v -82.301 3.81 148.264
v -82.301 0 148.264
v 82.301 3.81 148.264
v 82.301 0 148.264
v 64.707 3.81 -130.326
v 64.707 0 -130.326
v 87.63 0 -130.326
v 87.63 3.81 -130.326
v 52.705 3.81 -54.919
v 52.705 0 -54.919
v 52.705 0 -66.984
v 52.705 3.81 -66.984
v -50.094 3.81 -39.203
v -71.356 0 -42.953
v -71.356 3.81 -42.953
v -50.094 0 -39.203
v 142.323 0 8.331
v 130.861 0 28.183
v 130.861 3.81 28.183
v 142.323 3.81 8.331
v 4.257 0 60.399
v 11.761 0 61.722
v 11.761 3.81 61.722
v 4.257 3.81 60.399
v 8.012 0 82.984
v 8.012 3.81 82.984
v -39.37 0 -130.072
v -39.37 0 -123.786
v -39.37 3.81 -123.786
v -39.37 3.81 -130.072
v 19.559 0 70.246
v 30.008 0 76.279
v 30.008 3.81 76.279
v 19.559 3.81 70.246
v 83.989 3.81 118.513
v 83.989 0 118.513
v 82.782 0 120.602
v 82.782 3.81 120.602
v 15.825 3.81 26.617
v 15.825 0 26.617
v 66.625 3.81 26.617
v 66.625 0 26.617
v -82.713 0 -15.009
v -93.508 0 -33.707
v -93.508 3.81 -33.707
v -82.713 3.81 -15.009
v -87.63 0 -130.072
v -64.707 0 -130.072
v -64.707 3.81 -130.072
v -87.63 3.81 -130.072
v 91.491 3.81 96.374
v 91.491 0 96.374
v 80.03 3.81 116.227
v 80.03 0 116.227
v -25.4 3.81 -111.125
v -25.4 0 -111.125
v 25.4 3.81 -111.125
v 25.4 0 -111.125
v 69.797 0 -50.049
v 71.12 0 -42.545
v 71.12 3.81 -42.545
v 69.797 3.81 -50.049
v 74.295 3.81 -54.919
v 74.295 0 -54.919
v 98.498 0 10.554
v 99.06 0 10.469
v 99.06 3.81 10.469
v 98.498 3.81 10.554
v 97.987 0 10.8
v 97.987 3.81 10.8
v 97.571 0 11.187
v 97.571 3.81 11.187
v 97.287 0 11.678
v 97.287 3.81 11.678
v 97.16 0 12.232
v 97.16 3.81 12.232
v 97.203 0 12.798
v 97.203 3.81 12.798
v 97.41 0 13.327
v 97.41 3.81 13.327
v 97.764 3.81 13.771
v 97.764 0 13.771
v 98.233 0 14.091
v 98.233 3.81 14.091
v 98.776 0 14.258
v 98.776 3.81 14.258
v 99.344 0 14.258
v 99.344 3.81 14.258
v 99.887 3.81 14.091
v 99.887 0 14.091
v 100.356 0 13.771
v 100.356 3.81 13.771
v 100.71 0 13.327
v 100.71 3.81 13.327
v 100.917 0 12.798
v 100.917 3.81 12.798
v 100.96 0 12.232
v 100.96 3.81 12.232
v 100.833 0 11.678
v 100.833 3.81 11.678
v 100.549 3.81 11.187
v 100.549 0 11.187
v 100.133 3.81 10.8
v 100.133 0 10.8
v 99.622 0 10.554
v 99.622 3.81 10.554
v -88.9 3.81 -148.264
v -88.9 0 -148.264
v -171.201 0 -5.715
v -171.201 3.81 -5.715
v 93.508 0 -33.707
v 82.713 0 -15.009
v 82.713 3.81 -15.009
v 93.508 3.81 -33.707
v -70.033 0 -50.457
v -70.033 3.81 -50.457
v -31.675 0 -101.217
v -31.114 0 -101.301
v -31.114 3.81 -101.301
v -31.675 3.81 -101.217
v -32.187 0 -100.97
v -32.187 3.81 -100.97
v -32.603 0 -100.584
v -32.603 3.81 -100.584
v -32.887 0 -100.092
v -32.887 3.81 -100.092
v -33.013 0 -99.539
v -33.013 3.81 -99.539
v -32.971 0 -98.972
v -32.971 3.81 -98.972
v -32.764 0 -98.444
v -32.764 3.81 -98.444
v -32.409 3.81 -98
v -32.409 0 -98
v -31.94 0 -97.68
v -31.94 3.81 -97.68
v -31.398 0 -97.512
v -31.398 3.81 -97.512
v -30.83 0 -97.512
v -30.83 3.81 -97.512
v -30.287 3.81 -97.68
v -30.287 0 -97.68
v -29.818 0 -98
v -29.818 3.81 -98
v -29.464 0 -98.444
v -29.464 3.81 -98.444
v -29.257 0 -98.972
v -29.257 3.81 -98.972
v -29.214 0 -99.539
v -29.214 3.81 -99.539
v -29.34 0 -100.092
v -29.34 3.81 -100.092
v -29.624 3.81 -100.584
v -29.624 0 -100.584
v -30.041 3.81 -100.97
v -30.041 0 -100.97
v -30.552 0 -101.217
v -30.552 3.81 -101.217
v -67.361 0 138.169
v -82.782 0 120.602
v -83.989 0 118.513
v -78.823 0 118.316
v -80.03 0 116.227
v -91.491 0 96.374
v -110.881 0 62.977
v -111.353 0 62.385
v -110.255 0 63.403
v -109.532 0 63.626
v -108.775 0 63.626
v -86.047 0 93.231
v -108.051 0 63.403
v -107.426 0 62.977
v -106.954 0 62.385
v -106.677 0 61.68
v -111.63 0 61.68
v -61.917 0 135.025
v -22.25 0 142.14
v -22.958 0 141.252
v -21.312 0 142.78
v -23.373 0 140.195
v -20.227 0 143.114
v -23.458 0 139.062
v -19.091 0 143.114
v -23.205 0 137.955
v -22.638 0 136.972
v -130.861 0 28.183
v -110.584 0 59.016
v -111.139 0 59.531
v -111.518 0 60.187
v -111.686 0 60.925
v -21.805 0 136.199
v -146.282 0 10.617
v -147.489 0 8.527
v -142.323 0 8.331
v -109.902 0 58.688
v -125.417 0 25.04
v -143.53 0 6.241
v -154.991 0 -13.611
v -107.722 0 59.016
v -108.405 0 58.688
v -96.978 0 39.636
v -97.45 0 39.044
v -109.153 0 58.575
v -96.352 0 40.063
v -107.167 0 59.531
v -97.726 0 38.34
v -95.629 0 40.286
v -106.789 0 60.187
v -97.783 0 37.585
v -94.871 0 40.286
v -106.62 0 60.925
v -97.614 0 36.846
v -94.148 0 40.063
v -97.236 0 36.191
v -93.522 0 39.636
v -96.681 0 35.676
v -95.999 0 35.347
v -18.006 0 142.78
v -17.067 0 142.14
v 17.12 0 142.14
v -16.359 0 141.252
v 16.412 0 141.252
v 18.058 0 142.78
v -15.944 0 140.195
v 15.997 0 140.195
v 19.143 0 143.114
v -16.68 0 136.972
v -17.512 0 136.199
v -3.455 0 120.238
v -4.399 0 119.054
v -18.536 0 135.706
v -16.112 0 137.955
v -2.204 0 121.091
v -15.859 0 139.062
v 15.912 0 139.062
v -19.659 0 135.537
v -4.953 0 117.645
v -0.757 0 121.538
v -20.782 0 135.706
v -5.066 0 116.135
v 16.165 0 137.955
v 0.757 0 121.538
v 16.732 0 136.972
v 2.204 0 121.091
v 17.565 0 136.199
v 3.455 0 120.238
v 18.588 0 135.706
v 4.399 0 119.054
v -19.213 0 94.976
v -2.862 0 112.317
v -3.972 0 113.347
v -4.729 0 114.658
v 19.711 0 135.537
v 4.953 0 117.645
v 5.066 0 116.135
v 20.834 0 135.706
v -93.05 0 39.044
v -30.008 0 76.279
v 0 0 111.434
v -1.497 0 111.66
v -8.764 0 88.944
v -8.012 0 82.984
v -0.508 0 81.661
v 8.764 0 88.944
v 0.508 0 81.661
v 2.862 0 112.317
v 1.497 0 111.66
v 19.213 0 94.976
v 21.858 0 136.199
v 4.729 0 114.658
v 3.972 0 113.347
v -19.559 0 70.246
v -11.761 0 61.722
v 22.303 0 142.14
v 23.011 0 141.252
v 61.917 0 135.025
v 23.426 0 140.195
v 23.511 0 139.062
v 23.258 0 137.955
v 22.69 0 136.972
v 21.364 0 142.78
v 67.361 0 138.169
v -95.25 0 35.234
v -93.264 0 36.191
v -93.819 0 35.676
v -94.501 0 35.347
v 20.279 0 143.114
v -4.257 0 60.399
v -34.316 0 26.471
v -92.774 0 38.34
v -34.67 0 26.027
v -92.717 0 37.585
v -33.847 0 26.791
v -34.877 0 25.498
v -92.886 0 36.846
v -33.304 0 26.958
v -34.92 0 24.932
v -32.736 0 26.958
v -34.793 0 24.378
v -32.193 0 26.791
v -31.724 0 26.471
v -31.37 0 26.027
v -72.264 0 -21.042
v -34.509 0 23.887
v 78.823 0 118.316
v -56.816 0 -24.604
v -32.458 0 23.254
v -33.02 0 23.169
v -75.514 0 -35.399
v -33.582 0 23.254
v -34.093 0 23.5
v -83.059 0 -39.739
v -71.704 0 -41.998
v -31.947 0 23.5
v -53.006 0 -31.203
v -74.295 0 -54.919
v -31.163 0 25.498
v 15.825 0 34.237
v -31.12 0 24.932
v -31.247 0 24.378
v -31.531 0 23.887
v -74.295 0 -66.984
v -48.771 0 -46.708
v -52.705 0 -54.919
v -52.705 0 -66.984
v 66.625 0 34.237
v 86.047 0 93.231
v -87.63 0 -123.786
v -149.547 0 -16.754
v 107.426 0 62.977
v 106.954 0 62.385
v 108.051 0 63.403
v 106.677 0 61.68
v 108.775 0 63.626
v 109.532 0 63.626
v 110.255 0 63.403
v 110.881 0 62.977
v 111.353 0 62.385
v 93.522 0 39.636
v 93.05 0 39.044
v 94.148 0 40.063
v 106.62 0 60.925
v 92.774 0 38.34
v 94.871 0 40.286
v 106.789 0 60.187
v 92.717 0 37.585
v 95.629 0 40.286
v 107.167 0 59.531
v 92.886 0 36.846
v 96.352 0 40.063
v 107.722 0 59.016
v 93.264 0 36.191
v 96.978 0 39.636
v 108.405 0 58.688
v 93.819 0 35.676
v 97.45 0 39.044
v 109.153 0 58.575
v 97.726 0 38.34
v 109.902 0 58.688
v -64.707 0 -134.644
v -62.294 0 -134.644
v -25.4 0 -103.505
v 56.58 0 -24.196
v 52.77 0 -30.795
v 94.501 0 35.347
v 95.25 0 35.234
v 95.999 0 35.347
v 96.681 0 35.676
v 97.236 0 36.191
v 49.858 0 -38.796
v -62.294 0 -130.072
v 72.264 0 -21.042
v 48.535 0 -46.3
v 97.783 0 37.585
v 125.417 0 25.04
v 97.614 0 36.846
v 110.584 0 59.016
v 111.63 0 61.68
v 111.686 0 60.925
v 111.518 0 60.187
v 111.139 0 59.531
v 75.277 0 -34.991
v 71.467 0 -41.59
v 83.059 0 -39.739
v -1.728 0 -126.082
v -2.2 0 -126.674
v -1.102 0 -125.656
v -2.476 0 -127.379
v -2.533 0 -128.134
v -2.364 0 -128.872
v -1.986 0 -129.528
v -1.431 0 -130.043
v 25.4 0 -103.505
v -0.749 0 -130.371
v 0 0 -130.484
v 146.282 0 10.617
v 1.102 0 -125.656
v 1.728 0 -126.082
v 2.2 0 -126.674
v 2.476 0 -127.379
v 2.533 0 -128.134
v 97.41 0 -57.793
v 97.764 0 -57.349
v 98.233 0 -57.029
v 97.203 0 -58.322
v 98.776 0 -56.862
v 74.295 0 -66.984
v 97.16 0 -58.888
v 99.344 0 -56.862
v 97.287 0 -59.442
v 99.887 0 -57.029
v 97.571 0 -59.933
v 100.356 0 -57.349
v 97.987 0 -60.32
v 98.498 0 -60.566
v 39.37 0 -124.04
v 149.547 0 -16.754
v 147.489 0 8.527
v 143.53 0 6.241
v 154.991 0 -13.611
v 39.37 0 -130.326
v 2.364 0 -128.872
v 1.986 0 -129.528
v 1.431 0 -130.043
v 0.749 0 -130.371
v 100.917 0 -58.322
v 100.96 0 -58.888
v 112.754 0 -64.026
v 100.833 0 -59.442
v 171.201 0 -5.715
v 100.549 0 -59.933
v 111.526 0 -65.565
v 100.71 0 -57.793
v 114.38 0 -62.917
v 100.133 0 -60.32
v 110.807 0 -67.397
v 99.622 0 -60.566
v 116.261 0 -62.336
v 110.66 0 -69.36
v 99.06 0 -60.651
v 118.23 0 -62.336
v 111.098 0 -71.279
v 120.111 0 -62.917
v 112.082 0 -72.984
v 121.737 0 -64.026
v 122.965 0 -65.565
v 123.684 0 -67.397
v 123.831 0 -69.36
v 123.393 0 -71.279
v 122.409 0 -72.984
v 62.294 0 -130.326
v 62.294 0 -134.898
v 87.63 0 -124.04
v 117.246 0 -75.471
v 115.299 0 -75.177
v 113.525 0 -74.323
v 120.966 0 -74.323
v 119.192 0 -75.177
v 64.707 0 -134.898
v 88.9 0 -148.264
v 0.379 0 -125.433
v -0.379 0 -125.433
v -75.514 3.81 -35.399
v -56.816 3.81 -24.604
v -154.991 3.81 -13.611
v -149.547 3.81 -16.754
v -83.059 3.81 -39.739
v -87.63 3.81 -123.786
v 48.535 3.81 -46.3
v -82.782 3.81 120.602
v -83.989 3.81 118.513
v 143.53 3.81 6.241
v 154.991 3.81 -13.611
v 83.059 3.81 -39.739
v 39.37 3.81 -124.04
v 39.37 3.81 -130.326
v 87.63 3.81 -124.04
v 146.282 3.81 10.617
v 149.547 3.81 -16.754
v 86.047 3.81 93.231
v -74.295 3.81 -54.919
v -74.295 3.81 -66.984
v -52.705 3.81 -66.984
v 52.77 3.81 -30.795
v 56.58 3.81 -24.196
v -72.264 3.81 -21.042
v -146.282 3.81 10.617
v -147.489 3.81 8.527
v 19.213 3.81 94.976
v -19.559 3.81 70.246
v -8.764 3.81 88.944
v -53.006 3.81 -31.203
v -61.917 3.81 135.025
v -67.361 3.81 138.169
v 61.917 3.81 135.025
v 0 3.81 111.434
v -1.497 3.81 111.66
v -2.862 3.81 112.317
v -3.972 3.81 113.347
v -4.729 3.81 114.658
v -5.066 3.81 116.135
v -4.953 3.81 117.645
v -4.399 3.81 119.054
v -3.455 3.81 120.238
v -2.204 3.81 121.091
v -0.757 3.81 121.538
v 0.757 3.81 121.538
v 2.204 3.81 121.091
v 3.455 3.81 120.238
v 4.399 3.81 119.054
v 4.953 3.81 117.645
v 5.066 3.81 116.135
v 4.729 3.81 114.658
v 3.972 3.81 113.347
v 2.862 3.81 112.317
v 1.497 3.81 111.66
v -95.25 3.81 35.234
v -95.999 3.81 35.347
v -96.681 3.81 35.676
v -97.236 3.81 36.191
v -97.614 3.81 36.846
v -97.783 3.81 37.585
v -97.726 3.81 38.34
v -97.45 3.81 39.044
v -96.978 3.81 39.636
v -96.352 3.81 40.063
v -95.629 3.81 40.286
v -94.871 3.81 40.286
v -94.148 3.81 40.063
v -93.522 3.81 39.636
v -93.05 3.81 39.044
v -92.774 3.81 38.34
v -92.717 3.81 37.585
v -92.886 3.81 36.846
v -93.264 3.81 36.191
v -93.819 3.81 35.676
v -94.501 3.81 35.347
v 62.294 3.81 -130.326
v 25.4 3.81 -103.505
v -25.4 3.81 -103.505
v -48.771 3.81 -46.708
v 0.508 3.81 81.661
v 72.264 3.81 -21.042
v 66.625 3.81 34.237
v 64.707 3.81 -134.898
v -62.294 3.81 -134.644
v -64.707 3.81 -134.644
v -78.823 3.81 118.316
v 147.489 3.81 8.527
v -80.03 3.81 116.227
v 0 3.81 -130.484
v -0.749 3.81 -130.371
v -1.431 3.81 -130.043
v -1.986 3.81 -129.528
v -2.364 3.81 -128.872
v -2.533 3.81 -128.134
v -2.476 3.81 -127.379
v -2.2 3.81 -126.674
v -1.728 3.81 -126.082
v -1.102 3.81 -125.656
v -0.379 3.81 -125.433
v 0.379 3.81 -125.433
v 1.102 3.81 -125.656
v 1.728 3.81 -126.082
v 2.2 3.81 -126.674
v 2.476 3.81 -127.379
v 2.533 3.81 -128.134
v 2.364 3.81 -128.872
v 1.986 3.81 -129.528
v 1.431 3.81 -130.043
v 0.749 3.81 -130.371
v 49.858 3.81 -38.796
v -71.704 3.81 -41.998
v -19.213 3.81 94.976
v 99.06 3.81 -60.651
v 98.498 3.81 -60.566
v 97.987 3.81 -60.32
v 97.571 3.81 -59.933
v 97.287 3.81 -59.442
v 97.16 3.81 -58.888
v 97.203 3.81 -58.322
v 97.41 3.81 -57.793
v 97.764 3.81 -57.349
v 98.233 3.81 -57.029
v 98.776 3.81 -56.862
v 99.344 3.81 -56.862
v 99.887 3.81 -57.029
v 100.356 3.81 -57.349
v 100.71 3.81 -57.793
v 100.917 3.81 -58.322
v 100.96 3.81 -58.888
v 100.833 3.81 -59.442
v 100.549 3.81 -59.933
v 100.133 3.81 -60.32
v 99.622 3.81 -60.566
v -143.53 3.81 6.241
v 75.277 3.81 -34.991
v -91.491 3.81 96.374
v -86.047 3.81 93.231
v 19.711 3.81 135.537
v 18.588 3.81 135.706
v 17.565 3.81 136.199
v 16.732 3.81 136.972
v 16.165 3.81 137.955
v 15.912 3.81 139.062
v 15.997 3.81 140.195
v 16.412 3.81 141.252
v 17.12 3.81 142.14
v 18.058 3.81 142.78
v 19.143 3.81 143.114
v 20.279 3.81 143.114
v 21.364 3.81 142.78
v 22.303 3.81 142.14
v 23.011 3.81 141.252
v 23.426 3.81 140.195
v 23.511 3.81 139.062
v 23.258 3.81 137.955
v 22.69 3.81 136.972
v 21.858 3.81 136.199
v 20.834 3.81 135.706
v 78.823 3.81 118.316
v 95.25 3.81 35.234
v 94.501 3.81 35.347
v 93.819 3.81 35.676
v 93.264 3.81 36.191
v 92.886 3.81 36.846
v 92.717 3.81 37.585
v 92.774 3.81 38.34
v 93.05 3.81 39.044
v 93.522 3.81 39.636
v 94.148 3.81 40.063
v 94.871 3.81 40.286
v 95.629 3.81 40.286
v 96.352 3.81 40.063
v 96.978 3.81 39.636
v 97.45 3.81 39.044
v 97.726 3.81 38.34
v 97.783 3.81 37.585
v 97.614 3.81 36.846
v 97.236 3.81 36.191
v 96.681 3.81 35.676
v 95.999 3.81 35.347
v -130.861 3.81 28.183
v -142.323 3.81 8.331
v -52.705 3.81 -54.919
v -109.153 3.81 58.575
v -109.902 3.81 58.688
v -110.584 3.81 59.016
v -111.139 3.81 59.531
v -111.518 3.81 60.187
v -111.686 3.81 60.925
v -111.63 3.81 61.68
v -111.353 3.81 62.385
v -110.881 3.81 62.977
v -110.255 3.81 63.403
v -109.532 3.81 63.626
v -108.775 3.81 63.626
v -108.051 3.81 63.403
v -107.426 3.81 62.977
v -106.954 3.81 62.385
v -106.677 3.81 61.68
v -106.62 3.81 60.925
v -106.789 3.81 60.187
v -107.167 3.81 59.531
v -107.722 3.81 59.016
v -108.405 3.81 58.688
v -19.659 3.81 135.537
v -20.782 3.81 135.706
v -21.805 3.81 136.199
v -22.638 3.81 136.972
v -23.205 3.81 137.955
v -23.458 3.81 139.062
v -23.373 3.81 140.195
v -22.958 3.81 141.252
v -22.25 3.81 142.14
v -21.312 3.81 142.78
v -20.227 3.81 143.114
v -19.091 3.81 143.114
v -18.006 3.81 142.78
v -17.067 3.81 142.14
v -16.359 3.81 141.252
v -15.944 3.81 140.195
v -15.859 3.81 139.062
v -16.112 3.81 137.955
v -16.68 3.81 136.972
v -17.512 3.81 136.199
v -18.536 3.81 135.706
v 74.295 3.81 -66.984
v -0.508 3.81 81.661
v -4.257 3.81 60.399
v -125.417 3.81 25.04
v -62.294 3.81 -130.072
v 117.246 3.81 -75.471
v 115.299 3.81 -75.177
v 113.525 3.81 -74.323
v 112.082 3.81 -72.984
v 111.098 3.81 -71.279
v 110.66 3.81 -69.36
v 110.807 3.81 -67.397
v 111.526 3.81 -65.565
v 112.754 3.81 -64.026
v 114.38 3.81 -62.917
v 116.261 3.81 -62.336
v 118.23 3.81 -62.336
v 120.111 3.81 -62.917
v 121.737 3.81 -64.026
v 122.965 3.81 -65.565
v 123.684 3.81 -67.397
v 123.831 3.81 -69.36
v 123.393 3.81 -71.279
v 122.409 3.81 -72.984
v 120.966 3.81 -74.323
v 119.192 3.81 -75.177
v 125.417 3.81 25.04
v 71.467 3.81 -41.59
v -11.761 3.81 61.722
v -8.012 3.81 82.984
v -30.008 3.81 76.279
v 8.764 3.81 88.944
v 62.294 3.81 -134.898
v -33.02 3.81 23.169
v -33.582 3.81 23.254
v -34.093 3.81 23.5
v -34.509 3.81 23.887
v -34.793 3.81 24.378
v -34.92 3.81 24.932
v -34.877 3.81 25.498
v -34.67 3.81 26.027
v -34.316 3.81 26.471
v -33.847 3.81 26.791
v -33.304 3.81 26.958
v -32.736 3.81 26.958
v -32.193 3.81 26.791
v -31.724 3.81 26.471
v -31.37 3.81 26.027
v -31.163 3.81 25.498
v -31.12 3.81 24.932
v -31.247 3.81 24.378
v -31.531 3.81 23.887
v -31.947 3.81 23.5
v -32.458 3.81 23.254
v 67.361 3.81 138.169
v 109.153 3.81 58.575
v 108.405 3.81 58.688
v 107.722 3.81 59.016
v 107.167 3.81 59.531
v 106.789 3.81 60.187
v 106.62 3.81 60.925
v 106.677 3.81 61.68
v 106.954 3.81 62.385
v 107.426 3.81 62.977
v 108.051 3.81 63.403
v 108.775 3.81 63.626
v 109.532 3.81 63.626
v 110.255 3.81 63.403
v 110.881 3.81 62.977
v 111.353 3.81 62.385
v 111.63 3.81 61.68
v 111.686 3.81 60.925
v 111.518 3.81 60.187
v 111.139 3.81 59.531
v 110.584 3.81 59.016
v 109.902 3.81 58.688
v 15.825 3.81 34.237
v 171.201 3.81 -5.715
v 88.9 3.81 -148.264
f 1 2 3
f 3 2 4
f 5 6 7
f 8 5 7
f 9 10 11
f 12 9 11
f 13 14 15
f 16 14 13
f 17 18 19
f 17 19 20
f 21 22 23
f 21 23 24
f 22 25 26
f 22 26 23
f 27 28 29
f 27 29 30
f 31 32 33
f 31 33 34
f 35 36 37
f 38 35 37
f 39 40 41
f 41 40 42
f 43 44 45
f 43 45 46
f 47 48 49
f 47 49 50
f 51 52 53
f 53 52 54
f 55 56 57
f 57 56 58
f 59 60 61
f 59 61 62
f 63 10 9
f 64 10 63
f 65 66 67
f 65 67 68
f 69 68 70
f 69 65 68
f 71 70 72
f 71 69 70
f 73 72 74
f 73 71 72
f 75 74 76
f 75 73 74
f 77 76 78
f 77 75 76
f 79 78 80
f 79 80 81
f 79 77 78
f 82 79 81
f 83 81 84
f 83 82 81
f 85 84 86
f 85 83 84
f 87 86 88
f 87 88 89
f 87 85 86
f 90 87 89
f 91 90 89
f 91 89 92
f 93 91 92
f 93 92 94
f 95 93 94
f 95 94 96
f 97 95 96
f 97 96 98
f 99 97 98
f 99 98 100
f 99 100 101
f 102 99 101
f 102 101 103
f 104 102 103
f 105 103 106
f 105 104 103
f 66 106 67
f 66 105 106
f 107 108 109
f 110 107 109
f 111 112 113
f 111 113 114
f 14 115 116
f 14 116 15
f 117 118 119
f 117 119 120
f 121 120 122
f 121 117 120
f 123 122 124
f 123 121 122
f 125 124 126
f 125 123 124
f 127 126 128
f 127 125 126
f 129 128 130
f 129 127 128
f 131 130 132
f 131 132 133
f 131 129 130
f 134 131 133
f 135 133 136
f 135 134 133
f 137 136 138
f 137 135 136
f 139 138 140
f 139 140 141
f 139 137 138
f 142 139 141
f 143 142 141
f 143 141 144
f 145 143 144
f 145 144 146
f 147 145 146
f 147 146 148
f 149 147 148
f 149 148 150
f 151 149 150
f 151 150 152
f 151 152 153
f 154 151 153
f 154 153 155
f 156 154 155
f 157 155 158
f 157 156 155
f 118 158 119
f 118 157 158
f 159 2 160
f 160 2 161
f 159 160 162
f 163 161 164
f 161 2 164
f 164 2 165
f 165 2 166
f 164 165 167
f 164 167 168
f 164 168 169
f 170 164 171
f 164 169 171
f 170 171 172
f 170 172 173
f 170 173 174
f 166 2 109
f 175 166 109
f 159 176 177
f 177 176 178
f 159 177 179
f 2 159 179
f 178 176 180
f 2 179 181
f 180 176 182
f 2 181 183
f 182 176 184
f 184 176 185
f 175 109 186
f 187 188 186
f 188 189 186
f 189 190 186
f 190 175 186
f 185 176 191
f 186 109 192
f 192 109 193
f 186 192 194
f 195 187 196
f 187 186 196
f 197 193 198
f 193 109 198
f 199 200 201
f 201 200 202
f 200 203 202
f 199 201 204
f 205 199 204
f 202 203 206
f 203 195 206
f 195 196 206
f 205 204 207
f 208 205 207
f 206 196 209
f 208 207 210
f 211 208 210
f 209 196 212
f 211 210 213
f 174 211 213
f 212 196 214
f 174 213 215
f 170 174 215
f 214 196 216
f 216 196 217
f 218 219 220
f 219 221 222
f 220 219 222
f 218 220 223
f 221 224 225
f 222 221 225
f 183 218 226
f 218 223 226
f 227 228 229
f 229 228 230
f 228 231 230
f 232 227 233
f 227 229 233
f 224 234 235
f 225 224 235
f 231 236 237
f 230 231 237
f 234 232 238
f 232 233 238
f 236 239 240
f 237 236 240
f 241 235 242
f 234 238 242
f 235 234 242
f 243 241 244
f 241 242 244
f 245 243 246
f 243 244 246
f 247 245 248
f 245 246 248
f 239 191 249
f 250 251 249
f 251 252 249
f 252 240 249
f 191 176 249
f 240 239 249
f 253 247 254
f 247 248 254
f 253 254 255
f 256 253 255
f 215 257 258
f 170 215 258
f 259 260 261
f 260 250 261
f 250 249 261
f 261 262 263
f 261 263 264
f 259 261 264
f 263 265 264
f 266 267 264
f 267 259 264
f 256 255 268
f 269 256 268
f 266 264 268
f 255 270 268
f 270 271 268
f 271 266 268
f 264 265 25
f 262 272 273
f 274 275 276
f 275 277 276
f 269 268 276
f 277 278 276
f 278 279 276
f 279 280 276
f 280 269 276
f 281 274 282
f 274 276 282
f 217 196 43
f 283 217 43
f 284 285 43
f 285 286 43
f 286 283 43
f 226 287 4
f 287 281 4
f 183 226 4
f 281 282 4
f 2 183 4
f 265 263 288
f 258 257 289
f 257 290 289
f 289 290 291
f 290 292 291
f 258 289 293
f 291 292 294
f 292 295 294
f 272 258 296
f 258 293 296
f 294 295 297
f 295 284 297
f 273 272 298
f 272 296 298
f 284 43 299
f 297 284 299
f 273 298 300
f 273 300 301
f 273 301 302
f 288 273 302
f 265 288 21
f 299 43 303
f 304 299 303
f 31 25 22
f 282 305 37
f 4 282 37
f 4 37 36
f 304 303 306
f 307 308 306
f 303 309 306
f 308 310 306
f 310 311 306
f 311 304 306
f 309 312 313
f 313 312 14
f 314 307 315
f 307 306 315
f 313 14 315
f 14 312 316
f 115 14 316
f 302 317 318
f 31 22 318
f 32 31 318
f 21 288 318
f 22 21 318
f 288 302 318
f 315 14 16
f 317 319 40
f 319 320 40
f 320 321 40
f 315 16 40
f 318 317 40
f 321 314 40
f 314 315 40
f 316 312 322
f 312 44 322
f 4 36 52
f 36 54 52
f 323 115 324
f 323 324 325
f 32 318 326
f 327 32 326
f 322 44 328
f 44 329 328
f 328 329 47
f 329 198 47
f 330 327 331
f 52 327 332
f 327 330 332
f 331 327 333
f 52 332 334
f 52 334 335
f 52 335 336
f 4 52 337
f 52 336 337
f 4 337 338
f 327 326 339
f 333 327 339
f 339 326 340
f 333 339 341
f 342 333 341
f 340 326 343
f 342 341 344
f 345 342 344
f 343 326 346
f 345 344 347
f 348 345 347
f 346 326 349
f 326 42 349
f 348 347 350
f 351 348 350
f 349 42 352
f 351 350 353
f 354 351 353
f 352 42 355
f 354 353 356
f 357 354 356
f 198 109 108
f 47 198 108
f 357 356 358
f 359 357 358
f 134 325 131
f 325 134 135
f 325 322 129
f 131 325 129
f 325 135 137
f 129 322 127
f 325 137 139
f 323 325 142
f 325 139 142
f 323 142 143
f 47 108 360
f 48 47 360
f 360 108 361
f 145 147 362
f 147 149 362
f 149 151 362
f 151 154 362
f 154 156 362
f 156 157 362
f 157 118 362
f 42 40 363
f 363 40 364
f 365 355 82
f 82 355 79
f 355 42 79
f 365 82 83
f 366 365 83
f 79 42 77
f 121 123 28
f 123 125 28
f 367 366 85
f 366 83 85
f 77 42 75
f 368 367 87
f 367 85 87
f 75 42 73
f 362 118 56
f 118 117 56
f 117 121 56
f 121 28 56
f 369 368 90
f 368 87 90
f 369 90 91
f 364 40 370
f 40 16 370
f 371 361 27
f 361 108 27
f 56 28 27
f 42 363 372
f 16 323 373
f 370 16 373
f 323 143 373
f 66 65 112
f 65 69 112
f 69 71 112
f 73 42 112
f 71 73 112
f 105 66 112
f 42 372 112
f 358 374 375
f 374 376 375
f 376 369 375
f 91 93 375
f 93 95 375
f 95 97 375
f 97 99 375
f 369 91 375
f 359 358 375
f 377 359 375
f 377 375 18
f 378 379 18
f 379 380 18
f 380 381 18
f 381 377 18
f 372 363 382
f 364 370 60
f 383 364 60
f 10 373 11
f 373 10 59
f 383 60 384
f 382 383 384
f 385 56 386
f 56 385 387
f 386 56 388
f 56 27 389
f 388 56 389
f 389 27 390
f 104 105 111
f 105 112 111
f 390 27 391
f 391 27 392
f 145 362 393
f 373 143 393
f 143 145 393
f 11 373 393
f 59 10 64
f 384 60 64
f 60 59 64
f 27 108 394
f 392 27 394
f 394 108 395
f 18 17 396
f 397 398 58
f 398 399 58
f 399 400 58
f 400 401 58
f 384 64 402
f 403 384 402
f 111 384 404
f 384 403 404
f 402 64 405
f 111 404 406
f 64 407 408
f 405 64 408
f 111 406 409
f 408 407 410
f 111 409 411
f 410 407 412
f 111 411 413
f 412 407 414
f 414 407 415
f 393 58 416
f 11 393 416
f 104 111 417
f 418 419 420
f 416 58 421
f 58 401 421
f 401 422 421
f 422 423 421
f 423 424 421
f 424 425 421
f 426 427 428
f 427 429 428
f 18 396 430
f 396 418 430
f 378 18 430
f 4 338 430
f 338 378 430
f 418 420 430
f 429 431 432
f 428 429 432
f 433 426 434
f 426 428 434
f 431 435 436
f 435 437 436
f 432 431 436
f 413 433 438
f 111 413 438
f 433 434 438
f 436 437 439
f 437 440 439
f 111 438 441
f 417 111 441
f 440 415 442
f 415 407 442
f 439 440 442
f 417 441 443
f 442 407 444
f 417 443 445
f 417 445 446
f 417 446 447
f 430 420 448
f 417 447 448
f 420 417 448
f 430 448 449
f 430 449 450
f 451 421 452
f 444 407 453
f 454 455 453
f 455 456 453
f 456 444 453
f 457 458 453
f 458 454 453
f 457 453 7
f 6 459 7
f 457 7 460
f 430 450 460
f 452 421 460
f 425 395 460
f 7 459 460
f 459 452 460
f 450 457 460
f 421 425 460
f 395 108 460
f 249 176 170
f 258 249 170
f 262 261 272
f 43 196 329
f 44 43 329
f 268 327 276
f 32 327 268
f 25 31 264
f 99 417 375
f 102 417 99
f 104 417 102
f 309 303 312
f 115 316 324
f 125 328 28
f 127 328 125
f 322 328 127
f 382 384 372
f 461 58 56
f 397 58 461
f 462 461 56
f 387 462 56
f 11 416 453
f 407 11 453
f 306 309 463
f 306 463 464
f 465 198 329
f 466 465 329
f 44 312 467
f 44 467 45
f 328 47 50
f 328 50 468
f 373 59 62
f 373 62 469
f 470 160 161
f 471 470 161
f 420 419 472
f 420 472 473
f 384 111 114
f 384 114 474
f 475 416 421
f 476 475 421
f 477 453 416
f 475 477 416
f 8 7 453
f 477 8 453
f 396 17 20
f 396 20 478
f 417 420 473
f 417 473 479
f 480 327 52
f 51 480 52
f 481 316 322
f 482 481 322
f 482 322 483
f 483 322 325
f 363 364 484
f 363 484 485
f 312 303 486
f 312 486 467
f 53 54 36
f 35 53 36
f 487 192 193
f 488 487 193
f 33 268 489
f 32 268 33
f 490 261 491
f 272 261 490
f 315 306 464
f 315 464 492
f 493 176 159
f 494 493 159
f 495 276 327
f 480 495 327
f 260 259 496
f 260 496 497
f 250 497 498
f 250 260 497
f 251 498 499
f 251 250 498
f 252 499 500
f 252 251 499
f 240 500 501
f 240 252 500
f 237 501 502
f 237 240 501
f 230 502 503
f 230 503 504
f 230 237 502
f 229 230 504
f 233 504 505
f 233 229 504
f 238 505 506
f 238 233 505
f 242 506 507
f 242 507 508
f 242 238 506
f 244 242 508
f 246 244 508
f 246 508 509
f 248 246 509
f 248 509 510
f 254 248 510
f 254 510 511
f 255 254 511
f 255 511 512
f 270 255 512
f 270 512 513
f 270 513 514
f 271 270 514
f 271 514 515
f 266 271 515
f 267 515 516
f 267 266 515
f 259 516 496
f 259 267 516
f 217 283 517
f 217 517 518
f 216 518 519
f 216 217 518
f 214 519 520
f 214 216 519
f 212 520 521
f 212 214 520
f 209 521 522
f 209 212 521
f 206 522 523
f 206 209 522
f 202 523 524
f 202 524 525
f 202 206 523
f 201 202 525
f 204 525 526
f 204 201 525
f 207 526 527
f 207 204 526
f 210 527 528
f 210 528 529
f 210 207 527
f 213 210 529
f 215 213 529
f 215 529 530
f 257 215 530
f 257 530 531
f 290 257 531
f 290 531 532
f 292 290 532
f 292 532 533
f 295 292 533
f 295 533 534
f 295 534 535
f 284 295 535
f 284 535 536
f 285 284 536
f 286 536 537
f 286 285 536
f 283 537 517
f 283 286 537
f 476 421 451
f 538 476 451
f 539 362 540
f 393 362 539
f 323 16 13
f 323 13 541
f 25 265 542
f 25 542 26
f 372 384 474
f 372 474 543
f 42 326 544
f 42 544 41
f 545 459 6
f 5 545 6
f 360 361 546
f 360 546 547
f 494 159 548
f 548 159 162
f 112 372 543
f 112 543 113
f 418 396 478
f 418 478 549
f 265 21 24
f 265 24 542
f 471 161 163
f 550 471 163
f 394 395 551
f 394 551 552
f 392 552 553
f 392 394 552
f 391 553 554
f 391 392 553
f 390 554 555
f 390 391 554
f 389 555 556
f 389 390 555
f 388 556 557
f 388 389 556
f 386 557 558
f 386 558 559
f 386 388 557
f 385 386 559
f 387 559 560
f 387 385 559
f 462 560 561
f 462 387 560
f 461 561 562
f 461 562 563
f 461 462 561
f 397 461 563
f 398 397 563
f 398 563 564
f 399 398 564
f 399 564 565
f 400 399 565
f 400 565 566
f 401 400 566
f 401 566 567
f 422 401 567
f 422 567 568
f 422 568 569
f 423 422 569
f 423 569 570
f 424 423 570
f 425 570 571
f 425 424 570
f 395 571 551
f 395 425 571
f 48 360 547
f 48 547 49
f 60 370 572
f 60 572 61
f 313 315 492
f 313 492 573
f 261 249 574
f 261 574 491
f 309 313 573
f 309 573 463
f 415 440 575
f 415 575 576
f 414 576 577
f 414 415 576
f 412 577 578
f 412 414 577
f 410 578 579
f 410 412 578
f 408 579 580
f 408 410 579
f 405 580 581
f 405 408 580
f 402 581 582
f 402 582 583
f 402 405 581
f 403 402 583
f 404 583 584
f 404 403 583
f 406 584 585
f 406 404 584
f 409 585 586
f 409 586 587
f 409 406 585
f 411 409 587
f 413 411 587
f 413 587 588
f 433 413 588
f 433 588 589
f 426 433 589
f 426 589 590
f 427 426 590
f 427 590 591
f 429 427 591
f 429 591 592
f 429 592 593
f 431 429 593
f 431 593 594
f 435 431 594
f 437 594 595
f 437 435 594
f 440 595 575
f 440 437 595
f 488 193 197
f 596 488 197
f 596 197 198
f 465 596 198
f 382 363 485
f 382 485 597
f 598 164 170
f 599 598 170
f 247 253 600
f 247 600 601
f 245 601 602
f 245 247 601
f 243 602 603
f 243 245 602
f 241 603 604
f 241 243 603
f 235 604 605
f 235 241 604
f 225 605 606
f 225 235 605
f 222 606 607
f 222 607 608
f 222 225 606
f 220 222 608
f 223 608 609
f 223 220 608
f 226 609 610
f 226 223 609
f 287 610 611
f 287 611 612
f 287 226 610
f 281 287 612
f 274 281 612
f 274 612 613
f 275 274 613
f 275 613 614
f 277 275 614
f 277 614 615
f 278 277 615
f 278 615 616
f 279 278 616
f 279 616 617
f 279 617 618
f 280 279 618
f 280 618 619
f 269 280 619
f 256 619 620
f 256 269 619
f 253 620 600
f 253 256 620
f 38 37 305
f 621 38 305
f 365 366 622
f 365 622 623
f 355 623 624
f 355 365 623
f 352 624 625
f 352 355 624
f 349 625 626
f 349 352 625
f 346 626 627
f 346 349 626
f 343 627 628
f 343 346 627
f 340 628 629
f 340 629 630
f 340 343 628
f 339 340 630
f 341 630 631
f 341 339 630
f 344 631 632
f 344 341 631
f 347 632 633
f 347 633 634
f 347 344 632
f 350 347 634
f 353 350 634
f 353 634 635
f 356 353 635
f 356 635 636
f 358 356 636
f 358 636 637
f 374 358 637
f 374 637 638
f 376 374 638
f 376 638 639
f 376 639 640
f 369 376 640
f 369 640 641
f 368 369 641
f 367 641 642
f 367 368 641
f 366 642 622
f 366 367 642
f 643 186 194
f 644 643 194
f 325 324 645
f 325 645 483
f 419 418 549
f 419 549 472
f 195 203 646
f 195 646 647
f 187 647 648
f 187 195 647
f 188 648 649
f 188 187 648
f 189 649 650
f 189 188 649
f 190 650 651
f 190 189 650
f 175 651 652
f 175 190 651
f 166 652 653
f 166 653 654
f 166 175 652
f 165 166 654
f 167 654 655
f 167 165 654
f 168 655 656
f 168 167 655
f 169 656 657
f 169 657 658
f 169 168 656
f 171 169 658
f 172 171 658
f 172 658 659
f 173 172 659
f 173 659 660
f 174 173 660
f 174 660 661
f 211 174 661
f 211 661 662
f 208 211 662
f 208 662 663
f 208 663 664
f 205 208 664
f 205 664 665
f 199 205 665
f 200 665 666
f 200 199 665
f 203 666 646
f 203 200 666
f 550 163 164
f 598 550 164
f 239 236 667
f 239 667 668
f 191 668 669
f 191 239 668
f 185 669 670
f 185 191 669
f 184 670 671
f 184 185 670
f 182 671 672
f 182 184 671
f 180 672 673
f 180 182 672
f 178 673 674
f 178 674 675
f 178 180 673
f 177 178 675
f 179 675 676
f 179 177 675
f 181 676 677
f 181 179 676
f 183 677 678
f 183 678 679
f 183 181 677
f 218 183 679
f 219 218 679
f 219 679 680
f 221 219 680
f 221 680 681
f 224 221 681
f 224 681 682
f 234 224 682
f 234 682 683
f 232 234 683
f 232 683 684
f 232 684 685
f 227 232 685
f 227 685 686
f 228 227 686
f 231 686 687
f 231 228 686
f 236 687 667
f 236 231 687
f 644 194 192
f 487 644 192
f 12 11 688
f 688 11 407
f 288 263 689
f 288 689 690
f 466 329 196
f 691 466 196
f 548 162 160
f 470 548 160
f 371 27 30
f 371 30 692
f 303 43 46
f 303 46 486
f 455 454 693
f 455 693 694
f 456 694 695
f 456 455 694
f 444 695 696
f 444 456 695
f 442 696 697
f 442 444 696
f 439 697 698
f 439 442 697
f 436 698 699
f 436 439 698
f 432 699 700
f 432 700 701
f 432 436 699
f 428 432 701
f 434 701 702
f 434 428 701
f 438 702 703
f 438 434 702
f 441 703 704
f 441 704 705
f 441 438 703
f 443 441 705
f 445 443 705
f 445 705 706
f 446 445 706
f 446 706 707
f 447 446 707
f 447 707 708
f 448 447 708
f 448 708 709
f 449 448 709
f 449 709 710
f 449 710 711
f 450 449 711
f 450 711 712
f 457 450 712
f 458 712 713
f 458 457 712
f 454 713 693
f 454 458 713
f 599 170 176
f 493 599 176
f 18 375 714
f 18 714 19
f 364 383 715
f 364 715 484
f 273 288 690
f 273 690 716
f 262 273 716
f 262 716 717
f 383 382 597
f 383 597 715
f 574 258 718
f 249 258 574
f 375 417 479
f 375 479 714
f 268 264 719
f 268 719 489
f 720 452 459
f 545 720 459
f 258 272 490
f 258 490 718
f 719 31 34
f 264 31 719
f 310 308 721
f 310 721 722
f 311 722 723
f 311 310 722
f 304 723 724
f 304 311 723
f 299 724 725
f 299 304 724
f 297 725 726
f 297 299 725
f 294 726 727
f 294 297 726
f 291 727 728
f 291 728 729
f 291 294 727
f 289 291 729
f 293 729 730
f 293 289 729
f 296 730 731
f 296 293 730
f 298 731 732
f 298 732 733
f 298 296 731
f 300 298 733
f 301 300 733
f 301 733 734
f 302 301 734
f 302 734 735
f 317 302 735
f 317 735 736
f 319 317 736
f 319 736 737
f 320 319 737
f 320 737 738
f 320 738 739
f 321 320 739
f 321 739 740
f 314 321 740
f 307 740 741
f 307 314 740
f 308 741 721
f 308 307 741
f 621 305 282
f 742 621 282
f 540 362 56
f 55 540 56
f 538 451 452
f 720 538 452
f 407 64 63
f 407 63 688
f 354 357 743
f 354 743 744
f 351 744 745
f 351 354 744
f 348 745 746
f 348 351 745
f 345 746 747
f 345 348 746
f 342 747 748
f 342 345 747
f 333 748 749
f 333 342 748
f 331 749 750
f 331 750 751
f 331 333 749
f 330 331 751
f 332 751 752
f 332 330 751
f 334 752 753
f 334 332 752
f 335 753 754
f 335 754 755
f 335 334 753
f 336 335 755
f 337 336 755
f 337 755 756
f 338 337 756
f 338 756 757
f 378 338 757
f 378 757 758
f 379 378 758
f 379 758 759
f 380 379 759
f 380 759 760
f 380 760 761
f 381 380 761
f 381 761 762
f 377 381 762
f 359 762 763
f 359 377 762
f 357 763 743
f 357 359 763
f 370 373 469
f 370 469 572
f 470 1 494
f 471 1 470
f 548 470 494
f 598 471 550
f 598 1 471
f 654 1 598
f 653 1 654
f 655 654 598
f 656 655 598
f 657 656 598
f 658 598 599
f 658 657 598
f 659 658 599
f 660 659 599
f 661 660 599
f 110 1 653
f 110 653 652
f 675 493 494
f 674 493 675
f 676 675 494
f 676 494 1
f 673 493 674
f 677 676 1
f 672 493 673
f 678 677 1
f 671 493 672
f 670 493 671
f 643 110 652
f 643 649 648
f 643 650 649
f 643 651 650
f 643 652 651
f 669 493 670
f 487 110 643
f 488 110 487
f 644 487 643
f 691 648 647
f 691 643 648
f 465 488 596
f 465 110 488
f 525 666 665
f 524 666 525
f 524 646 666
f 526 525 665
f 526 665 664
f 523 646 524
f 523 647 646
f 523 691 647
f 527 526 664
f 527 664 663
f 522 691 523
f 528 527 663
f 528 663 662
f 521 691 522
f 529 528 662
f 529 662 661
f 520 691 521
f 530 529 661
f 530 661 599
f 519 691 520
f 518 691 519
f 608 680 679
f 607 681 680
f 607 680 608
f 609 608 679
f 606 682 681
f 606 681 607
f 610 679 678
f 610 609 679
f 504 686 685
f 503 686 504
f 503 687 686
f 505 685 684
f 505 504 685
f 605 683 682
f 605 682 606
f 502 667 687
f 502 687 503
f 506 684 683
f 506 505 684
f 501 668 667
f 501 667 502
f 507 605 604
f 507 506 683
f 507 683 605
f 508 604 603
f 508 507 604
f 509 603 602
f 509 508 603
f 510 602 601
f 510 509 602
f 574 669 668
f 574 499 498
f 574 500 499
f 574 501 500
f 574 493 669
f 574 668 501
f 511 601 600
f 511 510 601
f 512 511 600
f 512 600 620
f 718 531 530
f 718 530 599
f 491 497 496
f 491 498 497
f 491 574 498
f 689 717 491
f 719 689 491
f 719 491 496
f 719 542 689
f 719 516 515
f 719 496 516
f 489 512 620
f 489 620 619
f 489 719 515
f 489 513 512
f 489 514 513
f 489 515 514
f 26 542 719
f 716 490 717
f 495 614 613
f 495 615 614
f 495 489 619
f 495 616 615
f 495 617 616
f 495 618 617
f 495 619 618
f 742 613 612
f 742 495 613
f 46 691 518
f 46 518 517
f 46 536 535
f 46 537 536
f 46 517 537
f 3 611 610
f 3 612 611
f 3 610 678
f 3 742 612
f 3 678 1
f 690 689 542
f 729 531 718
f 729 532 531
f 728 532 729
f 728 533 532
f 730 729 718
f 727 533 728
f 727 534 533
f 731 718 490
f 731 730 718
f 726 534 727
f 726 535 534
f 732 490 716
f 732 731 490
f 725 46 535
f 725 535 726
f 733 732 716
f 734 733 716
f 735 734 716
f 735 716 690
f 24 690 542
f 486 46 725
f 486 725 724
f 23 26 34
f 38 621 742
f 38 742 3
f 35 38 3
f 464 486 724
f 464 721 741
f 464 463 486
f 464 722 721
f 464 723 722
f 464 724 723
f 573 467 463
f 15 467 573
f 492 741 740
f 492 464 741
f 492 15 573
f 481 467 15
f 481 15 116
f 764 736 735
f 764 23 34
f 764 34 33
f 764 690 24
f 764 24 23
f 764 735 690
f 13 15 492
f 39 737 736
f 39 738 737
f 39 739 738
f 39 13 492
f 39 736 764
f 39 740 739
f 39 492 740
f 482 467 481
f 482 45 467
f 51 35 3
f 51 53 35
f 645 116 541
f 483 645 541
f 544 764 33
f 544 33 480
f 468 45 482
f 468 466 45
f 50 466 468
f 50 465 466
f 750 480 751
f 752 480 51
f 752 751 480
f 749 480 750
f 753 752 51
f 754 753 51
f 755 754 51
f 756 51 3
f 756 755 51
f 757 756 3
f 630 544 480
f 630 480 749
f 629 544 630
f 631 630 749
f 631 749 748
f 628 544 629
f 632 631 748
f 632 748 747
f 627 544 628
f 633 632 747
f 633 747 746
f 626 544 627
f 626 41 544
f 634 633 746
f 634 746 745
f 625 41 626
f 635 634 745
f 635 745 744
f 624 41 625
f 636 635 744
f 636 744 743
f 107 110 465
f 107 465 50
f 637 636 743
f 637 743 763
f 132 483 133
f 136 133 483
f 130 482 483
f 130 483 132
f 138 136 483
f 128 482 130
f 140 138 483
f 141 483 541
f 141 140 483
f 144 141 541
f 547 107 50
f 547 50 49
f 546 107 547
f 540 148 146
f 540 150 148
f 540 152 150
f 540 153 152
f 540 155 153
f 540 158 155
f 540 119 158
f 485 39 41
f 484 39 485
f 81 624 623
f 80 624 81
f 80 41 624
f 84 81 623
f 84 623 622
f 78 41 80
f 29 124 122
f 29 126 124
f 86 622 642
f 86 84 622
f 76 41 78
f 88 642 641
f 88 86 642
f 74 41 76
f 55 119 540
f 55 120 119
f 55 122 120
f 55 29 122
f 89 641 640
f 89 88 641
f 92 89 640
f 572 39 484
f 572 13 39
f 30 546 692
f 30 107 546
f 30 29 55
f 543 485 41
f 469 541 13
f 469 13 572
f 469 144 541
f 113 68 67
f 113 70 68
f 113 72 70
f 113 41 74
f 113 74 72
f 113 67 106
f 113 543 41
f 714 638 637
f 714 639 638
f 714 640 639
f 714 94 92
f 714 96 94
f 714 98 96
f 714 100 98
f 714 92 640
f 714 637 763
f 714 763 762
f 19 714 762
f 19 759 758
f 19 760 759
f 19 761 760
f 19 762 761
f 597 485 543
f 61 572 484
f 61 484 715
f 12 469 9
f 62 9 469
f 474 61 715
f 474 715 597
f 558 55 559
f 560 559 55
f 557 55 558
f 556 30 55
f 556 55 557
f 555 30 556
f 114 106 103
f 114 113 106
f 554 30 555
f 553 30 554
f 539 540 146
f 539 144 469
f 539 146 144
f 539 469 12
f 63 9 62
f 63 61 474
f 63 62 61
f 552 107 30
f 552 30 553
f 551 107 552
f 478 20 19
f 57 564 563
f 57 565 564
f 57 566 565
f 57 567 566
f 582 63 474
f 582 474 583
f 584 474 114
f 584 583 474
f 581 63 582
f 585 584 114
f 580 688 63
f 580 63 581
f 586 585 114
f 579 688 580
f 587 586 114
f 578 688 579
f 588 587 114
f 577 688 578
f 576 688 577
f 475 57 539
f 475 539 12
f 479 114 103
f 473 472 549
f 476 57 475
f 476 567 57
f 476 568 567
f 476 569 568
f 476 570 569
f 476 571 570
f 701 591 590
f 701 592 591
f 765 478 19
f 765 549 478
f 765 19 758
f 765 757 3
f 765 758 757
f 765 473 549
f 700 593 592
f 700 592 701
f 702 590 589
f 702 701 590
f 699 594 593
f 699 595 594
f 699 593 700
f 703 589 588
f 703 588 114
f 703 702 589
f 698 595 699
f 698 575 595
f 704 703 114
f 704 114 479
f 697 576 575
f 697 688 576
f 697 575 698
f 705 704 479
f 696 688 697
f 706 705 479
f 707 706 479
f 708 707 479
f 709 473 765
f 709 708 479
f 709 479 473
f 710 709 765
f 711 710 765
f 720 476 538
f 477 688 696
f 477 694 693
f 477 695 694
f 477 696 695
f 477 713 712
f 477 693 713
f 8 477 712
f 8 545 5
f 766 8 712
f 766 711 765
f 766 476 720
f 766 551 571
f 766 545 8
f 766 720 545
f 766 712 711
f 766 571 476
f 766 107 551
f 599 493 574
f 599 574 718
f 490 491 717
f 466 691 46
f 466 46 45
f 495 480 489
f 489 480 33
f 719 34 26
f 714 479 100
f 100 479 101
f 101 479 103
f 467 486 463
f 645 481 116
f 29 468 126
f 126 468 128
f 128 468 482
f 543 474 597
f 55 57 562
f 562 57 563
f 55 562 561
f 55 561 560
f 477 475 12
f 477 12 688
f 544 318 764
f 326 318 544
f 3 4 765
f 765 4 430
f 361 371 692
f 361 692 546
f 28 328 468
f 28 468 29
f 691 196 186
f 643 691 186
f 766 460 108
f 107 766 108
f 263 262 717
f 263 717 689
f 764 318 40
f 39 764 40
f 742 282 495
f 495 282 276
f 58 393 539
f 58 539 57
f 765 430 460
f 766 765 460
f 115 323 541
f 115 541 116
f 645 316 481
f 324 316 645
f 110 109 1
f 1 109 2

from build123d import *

# Parameters (mm, degrees)
SKETCH1_R           = 5.08
SKETCH1_R_2         = 3.81
SKETCH1_R_3         = 2.54
SKETCH1_R_4         = 1.905
SKETCH1_R_5         = 6.604
SKETCH1_W           = 21.59
SKETCH1_H           = 12.065
SKETCH1_W_2         = 50.8
SKETCH1_H_2         = 7.62
BOSS_EXTRUDE1_DEPTH = 3.81


with BuildPart() as part:
    # Sketch1 → Boss-Extrude1 (new body)
    with BuildSketch(Plane(origin=(0, 0, 0), x_dir=(1, 0, 0), z_dir=(0, 1, 0))):
        Polygon((82.300886423, -148.264316793), (171.200886423, 5.715), (88.9, 148.264316793), (-88.9, 148.264316793), (-171.200886423, 5.715), (-82.300886423, -148.264316793), align=None)
        with Locations(Location((0, -116.514316793, 0), (0, 0, 90))):
            Circle(SKETCH1_R, mode=Mode.SUBTRACT)
        with Locations(Location((-19.658728346, -139.347010207, 0), (0, 0, 90))):
            Circle(SKETCH1_R_2, mode=Mode.SUBTRACT)
        with Locations(Location((19.711271654, -139.347010207, 0), (0, 0, 90))):
            Circle(SKETCH1_R_2, mode=Mode.SUBTRACT)
        with Locations(Location((-95.25, -37.774316793, 0), (0, 0, 90))):
            Circle(SKETCH1_R_3, mode=Mode.SUBTRACT)
        with Locations(Location((95.25, -37.774316793, 0), (0, 0, 90))):
            Circle(SKETCH1_R_3, mode=Mode.SUBTRACT)
        with Locations(Location((-31.113749598, 99.396218431, 0), (0, 0, 90))):
            Circle(SKETCH1_R_4, mode=Mode.SUBTRACT)
        with Locations(Location((-33.02, -25.074316793, 0), (0, 0, 90))):
            Circle(SKETCH1_R_4, mode=Mode.SUBTRACT)
        with Locations(Location((99.06, -12.374316793, 0), (0, 0, 90))):
            Circle(SKETCH1_R_4, mode=Mode.SUBTRACT)
        with Locations(Location((99.06, 58.745683207, 0), (0, 0, 90))):
            Circle(SKETCH1_R_4, mode=Mode.SUBTRACT)
        with Locations(Location((0, 127.944316793, 0), (0, 0, 90))):
            Circle(SKETCH1_R_3, mode=Mode.SUBTRACT)
        with Locations(Location((-109.153250218, -61.114658396, 0), (0, 0, 90))):
            Circle(SKETCH1_R_3, mode=Mode.SUBTRACT)
        with Locations(Location((109.153250218, -61.114658396, 0), (0, 0, 90))):
            Circle(SKETCH1_R_3, mode=Mode.SUBTRACT)
        with Locations(Location((117.245502559, 68.866615534, 0), (0, 0, 90))):
            Circle(SKETCH1_R_5, mode=Mode.SUBTRACT)
        Polygon((-39.37, 123.785885114), (-39.37, 130.072385114), (-62.2935, 130.072385114), (-62.2935, 134.644385114), (-64.7065, 134.644385114), (-64.7065, 130.072385114), (-87.63, 130.072385114), (-87.63, 123.785885114), align=None, mode=Mode.SUBTRACT)
        Polygon((39.37, 124.039885114), (39.37, 130.326385114), (62.2935, 130.326385114), (62.2935, 134.898385114), (64.7065, 134.898385114), (64.7065, 130.326385114), (87.63, 130.326385114), (87.63, 124.039885114), align=None, mode=Mode.SUBTRACT)
        Polygon((125.416983138, -25.040114979), (130.861251839, -28.183364979), (142.323001839, -8.331031636), (146.282469985, -10.617031636), (147.488969985, -8.527312336), (143.529501839, -6.241312336), (154.991251839, 13.611021007), (149.546983138, 16.754271007), align=None, mode=Mode.SUBTRACT)
        Polygon((86.046983138, -93.230955273), (91.491251839, -96.374205273), (80.029501839, -116.226538617), (83.988969985, -118.512538617), (82.782469985, -120.602257916), (78.823001839, -118.316257916), (67.361251839, -138.16859126), (61.916983138, -135.02534126), align=None, mode=Mode.SUBTRACT)
        Polygon((-61.916983138, -135.02534126), (-67.361251839, -138.16859126), (-78.823001839, -118.316257916), (-82.782469985, -120.602257916), (-83.988969985, -118.512538617), (-80.029501839, -116.226538617), (-91.491251839, -96.374205273), (-86.046983138, -93.230955273), align=None, mode=Mode.SUBTRACT)
        Polygon((-125.416983138, -25.040114979), (-130.861251839, -28.183364979), (-142.323001839, -8.331031636), (-146.282469985, -10.617031636), (-147.488969985, -8.527312336), (-143.529501839, -6.241312336), (-154.991251839, 13.611021007), (-149.546983138, 16.754271007), align=None, mode=Mode.SUBTRACT)
        with Locations((63.5, 60.951816793)):
            Rectangle(SKETCH1_W, SKETCH1_H, mode=Mode.SUBTRACT)
        Polygon((83.059245107, 39.739198978), (72.264245107, 21.04171051), (82.712841604, 15.00921051), (93.507841604, 33.706698978), align=None, mode=Mode.SUBTRACT)
        with Locations((-63.5, 60.951816793)):
            Rectangle(SKETCH1_W, SKETCH1_H, mode=Mode.SUBTRACT)
        Polygon((-72.264245107, 21.04171051), (-83.059245107, 39.739198978), (-93.507841604, 33.706698978), (-82.712841604, 15.00921051), align=None, mode=Mode.SUBTRACT)
        Polygon((-19.559245107, -70.246027303), (-30.007841604, -76.278527303), (-19.212841604, -94.976015771), (-8.764245107, -88.943515771), align=None, mode=Mode.SUBTRACT)
        Polygon((19.559245107, -70.246027303), (8.764245107, -88.943515771), (19.212841604, -94.976015771), (30.007841604, -76.278527303), align=None, mode=Mode.SUBTRACT)
        Polygon((-0.508, -81.661), (-4.257064156, -60.399000612), (-11.761299234, -61.722199726), (-8.012235078, -82.984199114), align=None, mode=Mode.SUBTRACT)
        Polygon((4.257064156, -60.399000612), (0.508, -81.661), (8.012235078, -82.984199114), (11.761299234, -61.722199726), align=None, mode=Mode.SUBTRACT)
        Polygon((71.467492466, 41.590272297), (52.770003998, 30.795272297), (56.580003998, 24.19615872), (75.277492466, 34.99115872), align=None, mode=Mode.SUBTRACT)
        Polygon((49.858000612, 38.795935844), (71.12, 42.545), (69.796800886, 50.049235078), (48.534801499, 46.300170922), align=None, mode=Mode.SUBTRACT)
        Polygon((-71.356016539, 42.952508085), (-50.094017152, 39.203443929), (-48.770818038, 46.707679007), (-70.032817426, 50.456743163), align=None, mode=Mode.SUBTRACT)
        Polygon((-53.006020537, 31.202780382), (-71.703509005, 41.997780382), (-75.513509005, 35.398666806), (-56.816020537, 24.603666806), align=None, mode=Mode.SUBTRACT)
        with Locations((0, 107.315)):
            Rectangle(SKETCH1_W_2, SKETCH1_H_2, mode=Mode.SUBTRACT)
        with Locations((41.224971045, -30.426673737)):
            Rectangle(SKETCH1_W_2, SKETCH1_H_2, mode=Mode.SUBTRACT)
    extrude(amount=BOSS_EXTRUDE1_DEPTH)


solid = part.part
